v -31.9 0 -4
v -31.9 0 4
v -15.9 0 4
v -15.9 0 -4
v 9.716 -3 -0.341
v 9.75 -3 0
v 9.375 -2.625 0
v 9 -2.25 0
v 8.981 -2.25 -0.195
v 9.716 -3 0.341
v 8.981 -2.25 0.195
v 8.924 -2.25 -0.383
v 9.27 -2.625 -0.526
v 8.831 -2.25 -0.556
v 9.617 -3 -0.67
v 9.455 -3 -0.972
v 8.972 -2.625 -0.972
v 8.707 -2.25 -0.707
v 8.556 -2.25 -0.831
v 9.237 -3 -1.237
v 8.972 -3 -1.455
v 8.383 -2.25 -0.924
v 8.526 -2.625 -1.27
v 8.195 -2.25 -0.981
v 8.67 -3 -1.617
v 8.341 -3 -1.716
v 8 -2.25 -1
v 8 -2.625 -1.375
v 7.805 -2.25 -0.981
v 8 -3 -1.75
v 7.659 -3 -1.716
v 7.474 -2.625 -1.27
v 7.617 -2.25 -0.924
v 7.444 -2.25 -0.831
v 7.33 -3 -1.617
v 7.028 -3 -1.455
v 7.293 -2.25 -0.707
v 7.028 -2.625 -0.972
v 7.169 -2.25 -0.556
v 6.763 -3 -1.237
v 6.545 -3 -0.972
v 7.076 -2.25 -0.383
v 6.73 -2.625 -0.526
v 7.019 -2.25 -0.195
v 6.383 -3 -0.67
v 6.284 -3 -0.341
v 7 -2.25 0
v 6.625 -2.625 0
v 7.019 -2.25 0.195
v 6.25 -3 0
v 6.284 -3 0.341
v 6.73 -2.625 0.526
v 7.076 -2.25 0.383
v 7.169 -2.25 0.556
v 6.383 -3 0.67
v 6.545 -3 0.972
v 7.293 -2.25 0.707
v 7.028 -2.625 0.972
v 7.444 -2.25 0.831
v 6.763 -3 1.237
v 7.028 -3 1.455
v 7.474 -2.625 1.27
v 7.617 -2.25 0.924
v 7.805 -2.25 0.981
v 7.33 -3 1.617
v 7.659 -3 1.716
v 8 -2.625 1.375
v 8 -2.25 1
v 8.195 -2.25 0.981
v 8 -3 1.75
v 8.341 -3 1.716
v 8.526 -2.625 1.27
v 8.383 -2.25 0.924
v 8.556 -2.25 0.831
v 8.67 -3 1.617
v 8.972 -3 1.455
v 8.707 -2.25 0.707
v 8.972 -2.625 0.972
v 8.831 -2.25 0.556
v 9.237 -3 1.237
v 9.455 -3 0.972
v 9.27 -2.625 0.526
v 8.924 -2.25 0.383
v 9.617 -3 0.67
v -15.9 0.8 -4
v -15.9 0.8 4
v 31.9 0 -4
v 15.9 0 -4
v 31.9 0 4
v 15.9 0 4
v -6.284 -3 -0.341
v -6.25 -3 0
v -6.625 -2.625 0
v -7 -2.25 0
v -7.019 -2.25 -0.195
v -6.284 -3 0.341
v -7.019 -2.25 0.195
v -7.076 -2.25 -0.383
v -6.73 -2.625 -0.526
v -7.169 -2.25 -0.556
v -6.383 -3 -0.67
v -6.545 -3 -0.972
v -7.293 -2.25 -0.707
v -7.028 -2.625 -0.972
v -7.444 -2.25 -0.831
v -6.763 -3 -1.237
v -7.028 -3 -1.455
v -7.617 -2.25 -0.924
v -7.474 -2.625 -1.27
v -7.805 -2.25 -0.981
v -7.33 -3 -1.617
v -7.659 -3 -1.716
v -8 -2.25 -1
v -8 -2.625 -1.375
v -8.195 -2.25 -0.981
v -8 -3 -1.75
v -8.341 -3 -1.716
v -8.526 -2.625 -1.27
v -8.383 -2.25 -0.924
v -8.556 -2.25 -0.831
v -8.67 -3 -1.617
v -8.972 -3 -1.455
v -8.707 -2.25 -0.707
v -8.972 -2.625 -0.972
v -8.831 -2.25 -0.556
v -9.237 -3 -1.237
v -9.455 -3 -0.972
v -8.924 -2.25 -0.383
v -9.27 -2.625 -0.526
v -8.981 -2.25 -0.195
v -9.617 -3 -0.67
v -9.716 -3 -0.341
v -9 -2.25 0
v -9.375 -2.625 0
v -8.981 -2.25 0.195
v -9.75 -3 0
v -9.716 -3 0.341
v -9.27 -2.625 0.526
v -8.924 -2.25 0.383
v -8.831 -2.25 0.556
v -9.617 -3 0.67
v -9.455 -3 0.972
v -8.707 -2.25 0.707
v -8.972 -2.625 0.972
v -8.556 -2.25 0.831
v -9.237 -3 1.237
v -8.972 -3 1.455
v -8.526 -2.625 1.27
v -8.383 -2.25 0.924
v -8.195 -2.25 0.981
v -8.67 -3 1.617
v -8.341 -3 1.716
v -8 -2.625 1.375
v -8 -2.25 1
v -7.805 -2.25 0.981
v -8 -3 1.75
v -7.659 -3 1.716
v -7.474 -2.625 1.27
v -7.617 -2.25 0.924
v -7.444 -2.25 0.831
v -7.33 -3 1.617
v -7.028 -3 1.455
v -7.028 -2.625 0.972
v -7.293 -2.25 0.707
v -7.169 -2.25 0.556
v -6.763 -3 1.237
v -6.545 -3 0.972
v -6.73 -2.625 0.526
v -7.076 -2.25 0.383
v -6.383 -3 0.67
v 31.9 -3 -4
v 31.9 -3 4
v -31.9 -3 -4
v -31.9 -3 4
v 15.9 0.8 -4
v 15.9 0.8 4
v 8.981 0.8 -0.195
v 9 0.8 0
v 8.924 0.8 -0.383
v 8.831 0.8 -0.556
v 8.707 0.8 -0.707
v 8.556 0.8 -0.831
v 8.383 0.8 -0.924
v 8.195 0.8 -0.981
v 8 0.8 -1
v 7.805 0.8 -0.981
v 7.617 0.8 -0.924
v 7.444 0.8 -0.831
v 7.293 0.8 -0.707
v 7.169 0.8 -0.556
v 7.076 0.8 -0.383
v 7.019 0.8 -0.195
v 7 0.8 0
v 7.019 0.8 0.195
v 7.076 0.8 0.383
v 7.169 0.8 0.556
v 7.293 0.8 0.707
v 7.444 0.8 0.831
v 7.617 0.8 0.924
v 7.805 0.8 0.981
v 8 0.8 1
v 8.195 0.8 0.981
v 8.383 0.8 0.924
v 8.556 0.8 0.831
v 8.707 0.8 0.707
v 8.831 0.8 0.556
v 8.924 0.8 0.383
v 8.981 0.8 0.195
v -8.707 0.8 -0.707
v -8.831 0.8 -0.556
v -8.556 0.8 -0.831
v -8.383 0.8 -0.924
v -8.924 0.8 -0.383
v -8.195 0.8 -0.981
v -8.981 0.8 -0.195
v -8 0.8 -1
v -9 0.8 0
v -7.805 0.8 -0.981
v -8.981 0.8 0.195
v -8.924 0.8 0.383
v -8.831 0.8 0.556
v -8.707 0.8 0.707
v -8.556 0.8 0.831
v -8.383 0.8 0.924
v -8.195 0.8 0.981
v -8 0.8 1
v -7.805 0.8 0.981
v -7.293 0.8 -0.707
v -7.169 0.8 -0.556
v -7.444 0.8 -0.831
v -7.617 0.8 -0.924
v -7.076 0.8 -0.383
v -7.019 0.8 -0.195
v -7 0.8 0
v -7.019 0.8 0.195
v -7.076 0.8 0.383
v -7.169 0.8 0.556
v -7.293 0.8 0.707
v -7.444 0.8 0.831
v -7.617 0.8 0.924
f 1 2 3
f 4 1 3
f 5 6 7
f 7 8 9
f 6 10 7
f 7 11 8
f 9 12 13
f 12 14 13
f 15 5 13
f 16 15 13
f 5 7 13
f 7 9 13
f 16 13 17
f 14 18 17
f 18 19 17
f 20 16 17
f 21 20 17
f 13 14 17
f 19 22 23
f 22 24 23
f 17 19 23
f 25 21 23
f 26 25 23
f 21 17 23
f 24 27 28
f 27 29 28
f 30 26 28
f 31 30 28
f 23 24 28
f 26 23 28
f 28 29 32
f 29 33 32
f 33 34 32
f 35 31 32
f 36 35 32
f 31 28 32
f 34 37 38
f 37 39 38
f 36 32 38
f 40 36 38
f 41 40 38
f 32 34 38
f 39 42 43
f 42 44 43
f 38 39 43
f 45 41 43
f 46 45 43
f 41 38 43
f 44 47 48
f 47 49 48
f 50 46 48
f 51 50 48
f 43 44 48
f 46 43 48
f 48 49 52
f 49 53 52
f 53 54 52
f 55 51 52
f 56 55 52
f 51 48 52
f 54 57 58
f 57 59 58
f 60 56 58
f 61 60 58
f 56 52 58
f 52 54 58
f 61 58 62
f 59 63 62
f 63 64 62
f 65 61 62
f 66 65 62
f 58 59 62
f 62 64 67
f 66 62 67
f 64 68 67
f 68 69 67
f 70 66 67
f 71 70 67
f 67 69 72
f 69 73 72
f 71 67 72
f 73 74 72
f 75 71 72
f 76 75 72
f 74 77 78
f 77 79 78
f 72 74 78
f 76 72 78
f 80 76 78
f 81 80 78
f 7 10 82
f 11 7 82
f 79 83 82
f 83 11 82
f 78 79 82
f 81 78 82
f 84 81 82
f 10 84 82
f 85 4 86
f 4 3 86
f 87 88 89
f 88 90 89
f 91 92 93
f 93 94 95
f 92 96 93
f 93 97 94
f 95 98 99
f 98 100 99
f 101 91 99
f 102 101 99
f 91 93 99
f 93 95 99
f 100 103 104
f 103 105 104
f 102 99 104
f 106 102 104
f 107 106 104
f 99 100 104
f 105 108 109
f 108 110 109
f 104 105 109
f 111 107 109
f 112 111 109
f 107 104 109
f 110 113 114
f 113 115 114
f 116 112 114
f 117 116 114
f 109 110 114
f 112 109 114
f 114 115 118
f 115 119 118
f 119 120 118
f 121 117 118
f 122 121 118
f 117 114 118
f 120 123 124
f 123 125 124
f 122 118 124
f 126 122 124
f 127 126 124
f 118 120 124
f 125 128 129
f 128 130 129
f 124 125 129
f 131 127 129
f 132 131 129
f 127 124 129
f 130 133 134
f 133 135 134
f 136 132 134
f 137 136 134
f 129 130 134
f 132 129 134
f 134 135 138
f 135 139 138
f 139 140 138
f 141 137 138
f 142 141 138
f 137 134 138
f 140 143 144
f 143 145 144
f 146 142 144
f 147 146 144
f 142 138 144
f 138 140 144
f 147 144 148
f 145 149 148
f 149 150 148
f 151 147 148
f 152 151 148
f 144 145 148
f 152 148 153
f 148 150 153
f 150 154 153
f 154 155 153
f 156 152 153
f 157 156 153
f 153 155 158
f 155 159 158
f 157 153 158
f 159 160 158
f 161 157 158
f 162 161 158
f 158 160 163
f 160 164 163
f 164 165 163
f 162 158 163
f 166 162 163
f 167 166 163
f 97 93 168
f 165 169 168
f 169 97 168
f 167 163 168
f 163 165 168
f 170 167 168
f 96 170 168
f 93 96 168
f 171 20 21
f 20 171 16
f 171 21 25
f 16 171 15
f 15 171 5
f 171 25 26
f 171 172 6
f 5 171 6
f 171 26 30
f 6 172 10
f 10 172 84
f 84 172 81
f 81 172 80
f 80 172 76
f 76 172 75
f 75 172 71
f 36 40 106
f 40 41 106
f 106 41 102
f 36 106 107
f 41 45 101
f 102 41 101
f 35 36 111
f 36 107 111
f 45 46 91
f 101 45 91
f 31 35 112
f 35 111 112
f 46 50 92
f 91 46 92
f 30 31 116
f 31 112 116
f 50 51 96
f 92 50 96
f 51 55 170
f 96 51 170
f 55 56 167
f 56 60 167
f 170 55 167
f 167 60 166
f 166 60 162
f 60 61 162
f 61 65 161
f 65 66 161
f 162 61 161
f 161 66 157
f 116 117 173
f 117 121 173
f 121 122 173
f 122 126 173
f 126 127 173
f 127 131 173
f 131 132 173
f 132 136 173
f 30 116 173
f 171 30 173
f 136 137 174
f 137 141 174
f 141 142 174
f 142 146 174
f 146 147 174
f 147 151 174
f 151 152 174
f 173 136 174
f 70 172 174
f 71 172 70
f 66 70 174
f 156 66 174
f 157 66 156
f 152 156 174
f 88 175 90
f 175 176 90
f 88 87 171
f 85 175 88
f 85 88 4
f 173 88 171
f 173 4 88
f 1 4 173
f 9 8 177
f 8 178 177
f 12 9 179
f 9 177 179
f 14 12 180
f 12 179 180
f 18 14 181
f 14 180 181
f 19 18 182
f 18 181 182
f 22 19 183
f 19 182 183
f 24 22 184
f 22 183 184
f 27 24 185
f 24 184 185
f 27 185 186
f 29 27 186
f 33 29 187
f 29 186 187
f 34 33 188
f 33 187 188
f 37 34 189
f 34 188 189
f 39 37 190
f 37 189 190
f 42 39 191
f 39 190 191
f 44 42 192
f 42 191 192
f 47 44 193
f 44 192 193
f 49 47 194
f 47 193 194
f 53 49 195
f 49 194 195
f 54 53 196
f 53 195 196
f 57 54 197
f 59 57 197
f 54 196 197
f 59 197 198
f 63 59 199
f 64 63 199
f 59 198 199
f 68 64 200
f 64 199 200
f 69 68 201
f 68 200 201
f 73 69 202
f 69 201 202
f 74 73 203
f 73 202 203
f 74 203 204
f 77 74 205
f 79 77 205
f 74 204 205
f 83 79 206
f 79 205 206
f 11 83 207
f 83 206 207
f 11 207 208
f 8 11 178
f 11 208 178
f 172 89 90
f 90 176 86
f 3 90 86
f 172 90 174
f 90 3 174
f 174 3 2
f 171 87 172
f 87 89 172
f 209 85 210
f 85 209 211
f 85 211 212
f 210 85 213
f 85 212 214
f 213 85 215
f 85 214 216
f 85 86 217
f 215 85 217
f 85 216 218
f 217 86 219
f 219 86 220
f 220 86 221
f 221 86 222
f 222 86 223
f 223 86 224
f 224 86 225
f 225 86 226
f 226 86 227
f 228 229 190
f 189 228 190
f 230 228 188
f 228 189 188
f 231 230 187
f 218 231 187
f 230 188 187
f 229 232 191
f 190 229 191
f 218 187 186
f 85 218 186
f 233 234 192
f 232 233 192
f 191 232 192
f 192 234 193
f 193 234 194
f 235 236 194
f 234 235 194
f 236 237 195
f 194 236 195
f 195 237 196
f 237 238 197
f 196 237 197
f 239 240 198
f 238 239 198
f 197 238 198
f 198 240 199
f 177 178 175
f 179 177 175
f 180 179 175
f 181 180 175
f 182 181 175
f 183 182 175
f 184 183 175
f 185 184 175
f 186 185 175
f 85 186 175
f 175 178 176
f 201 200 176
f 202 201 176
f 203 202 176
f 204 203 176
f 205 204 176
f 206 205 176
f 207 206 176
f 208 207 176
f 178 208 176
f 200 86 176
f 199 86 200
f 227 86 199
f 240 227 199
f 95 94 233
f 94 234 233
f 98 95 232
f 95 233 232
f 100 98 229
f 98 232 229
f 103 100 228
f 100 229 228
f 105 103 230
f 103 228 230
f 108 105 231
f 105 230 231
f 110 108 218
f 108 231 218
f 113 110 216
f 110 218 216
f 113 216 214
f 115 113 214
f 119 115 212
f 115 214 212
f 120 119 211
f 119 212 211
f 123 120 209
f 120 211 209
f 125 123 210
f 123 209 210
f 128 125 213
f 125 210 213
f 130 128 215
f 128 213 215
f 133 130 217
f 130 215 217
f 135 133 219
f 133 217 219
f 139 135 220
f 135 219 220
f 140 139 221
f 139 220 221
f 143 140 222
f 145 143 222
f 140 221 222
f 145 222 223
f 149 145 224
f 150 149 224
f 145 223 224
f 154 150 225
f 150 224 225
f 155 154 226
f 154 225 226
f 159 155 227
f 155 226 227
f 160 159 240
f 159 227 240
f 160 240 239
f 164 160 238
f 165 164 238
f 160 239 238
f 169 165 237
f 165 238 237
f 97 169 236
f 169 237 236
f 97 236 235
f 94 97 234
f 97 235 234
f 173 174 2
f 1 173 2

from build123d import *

# Parameters (mm, degrees)
AUFSATZ_LINEAR_AUSTRAGEN1_DEPTH                      = 4
FORMSENKUNG_F_R_M3_SENKSCHRAUBE_MIT_INNE_D           = 2
FORMSENKUNG_F_R_M3_SENKSCHRAUBE_MIT_INNE_CSINK_D     = 3.5
FORMSENKUNG_F_R_M3_SENKSCHRAUBE_MIT_INNE_CSINK_ANGLE = 90


with BuildPart() as part:
    # Skizze1 → Aufsatz-Linear austragen1 (new body, symmetric)
    with BuildSketch(Plane.XY):
        Polygon((-31.9, 0), (-15.9, 0), (-15.9, 0.8), (15.9, 0.8), (15.9, 0), (31.9, 0), (31.9, -3), (-31.9, -3), align=None)
    extrude(amount=AUFSATZ_LINEAR_AUSTRAGEN1_DEPTH, both=True)

    # Formsenkung für M3 Senkschraube mit Innensechskant1 (through all)
    with Locations(Plane(origin=(0, -3, 0), x_dir=(-1, 0, 0), z_dir=(0, -1, 0))):
        with Locations((8, 0), (-8, 0)):
            CounterSinkHole(FORMSENKUNG_F_R_M3_SENKSCHRAUBE_MIT_INNE_D / 2, FORMSENKUNG_F_R_M3_SENKSCHRAUBE_MIT_INNE_CSINK_D / 2, counter_sink_angle=FORMSENKUNG_F_R_M3_SENKSCHRAUBE_MIT_INNE_CSINK_ANGLE)


solid = part.part
